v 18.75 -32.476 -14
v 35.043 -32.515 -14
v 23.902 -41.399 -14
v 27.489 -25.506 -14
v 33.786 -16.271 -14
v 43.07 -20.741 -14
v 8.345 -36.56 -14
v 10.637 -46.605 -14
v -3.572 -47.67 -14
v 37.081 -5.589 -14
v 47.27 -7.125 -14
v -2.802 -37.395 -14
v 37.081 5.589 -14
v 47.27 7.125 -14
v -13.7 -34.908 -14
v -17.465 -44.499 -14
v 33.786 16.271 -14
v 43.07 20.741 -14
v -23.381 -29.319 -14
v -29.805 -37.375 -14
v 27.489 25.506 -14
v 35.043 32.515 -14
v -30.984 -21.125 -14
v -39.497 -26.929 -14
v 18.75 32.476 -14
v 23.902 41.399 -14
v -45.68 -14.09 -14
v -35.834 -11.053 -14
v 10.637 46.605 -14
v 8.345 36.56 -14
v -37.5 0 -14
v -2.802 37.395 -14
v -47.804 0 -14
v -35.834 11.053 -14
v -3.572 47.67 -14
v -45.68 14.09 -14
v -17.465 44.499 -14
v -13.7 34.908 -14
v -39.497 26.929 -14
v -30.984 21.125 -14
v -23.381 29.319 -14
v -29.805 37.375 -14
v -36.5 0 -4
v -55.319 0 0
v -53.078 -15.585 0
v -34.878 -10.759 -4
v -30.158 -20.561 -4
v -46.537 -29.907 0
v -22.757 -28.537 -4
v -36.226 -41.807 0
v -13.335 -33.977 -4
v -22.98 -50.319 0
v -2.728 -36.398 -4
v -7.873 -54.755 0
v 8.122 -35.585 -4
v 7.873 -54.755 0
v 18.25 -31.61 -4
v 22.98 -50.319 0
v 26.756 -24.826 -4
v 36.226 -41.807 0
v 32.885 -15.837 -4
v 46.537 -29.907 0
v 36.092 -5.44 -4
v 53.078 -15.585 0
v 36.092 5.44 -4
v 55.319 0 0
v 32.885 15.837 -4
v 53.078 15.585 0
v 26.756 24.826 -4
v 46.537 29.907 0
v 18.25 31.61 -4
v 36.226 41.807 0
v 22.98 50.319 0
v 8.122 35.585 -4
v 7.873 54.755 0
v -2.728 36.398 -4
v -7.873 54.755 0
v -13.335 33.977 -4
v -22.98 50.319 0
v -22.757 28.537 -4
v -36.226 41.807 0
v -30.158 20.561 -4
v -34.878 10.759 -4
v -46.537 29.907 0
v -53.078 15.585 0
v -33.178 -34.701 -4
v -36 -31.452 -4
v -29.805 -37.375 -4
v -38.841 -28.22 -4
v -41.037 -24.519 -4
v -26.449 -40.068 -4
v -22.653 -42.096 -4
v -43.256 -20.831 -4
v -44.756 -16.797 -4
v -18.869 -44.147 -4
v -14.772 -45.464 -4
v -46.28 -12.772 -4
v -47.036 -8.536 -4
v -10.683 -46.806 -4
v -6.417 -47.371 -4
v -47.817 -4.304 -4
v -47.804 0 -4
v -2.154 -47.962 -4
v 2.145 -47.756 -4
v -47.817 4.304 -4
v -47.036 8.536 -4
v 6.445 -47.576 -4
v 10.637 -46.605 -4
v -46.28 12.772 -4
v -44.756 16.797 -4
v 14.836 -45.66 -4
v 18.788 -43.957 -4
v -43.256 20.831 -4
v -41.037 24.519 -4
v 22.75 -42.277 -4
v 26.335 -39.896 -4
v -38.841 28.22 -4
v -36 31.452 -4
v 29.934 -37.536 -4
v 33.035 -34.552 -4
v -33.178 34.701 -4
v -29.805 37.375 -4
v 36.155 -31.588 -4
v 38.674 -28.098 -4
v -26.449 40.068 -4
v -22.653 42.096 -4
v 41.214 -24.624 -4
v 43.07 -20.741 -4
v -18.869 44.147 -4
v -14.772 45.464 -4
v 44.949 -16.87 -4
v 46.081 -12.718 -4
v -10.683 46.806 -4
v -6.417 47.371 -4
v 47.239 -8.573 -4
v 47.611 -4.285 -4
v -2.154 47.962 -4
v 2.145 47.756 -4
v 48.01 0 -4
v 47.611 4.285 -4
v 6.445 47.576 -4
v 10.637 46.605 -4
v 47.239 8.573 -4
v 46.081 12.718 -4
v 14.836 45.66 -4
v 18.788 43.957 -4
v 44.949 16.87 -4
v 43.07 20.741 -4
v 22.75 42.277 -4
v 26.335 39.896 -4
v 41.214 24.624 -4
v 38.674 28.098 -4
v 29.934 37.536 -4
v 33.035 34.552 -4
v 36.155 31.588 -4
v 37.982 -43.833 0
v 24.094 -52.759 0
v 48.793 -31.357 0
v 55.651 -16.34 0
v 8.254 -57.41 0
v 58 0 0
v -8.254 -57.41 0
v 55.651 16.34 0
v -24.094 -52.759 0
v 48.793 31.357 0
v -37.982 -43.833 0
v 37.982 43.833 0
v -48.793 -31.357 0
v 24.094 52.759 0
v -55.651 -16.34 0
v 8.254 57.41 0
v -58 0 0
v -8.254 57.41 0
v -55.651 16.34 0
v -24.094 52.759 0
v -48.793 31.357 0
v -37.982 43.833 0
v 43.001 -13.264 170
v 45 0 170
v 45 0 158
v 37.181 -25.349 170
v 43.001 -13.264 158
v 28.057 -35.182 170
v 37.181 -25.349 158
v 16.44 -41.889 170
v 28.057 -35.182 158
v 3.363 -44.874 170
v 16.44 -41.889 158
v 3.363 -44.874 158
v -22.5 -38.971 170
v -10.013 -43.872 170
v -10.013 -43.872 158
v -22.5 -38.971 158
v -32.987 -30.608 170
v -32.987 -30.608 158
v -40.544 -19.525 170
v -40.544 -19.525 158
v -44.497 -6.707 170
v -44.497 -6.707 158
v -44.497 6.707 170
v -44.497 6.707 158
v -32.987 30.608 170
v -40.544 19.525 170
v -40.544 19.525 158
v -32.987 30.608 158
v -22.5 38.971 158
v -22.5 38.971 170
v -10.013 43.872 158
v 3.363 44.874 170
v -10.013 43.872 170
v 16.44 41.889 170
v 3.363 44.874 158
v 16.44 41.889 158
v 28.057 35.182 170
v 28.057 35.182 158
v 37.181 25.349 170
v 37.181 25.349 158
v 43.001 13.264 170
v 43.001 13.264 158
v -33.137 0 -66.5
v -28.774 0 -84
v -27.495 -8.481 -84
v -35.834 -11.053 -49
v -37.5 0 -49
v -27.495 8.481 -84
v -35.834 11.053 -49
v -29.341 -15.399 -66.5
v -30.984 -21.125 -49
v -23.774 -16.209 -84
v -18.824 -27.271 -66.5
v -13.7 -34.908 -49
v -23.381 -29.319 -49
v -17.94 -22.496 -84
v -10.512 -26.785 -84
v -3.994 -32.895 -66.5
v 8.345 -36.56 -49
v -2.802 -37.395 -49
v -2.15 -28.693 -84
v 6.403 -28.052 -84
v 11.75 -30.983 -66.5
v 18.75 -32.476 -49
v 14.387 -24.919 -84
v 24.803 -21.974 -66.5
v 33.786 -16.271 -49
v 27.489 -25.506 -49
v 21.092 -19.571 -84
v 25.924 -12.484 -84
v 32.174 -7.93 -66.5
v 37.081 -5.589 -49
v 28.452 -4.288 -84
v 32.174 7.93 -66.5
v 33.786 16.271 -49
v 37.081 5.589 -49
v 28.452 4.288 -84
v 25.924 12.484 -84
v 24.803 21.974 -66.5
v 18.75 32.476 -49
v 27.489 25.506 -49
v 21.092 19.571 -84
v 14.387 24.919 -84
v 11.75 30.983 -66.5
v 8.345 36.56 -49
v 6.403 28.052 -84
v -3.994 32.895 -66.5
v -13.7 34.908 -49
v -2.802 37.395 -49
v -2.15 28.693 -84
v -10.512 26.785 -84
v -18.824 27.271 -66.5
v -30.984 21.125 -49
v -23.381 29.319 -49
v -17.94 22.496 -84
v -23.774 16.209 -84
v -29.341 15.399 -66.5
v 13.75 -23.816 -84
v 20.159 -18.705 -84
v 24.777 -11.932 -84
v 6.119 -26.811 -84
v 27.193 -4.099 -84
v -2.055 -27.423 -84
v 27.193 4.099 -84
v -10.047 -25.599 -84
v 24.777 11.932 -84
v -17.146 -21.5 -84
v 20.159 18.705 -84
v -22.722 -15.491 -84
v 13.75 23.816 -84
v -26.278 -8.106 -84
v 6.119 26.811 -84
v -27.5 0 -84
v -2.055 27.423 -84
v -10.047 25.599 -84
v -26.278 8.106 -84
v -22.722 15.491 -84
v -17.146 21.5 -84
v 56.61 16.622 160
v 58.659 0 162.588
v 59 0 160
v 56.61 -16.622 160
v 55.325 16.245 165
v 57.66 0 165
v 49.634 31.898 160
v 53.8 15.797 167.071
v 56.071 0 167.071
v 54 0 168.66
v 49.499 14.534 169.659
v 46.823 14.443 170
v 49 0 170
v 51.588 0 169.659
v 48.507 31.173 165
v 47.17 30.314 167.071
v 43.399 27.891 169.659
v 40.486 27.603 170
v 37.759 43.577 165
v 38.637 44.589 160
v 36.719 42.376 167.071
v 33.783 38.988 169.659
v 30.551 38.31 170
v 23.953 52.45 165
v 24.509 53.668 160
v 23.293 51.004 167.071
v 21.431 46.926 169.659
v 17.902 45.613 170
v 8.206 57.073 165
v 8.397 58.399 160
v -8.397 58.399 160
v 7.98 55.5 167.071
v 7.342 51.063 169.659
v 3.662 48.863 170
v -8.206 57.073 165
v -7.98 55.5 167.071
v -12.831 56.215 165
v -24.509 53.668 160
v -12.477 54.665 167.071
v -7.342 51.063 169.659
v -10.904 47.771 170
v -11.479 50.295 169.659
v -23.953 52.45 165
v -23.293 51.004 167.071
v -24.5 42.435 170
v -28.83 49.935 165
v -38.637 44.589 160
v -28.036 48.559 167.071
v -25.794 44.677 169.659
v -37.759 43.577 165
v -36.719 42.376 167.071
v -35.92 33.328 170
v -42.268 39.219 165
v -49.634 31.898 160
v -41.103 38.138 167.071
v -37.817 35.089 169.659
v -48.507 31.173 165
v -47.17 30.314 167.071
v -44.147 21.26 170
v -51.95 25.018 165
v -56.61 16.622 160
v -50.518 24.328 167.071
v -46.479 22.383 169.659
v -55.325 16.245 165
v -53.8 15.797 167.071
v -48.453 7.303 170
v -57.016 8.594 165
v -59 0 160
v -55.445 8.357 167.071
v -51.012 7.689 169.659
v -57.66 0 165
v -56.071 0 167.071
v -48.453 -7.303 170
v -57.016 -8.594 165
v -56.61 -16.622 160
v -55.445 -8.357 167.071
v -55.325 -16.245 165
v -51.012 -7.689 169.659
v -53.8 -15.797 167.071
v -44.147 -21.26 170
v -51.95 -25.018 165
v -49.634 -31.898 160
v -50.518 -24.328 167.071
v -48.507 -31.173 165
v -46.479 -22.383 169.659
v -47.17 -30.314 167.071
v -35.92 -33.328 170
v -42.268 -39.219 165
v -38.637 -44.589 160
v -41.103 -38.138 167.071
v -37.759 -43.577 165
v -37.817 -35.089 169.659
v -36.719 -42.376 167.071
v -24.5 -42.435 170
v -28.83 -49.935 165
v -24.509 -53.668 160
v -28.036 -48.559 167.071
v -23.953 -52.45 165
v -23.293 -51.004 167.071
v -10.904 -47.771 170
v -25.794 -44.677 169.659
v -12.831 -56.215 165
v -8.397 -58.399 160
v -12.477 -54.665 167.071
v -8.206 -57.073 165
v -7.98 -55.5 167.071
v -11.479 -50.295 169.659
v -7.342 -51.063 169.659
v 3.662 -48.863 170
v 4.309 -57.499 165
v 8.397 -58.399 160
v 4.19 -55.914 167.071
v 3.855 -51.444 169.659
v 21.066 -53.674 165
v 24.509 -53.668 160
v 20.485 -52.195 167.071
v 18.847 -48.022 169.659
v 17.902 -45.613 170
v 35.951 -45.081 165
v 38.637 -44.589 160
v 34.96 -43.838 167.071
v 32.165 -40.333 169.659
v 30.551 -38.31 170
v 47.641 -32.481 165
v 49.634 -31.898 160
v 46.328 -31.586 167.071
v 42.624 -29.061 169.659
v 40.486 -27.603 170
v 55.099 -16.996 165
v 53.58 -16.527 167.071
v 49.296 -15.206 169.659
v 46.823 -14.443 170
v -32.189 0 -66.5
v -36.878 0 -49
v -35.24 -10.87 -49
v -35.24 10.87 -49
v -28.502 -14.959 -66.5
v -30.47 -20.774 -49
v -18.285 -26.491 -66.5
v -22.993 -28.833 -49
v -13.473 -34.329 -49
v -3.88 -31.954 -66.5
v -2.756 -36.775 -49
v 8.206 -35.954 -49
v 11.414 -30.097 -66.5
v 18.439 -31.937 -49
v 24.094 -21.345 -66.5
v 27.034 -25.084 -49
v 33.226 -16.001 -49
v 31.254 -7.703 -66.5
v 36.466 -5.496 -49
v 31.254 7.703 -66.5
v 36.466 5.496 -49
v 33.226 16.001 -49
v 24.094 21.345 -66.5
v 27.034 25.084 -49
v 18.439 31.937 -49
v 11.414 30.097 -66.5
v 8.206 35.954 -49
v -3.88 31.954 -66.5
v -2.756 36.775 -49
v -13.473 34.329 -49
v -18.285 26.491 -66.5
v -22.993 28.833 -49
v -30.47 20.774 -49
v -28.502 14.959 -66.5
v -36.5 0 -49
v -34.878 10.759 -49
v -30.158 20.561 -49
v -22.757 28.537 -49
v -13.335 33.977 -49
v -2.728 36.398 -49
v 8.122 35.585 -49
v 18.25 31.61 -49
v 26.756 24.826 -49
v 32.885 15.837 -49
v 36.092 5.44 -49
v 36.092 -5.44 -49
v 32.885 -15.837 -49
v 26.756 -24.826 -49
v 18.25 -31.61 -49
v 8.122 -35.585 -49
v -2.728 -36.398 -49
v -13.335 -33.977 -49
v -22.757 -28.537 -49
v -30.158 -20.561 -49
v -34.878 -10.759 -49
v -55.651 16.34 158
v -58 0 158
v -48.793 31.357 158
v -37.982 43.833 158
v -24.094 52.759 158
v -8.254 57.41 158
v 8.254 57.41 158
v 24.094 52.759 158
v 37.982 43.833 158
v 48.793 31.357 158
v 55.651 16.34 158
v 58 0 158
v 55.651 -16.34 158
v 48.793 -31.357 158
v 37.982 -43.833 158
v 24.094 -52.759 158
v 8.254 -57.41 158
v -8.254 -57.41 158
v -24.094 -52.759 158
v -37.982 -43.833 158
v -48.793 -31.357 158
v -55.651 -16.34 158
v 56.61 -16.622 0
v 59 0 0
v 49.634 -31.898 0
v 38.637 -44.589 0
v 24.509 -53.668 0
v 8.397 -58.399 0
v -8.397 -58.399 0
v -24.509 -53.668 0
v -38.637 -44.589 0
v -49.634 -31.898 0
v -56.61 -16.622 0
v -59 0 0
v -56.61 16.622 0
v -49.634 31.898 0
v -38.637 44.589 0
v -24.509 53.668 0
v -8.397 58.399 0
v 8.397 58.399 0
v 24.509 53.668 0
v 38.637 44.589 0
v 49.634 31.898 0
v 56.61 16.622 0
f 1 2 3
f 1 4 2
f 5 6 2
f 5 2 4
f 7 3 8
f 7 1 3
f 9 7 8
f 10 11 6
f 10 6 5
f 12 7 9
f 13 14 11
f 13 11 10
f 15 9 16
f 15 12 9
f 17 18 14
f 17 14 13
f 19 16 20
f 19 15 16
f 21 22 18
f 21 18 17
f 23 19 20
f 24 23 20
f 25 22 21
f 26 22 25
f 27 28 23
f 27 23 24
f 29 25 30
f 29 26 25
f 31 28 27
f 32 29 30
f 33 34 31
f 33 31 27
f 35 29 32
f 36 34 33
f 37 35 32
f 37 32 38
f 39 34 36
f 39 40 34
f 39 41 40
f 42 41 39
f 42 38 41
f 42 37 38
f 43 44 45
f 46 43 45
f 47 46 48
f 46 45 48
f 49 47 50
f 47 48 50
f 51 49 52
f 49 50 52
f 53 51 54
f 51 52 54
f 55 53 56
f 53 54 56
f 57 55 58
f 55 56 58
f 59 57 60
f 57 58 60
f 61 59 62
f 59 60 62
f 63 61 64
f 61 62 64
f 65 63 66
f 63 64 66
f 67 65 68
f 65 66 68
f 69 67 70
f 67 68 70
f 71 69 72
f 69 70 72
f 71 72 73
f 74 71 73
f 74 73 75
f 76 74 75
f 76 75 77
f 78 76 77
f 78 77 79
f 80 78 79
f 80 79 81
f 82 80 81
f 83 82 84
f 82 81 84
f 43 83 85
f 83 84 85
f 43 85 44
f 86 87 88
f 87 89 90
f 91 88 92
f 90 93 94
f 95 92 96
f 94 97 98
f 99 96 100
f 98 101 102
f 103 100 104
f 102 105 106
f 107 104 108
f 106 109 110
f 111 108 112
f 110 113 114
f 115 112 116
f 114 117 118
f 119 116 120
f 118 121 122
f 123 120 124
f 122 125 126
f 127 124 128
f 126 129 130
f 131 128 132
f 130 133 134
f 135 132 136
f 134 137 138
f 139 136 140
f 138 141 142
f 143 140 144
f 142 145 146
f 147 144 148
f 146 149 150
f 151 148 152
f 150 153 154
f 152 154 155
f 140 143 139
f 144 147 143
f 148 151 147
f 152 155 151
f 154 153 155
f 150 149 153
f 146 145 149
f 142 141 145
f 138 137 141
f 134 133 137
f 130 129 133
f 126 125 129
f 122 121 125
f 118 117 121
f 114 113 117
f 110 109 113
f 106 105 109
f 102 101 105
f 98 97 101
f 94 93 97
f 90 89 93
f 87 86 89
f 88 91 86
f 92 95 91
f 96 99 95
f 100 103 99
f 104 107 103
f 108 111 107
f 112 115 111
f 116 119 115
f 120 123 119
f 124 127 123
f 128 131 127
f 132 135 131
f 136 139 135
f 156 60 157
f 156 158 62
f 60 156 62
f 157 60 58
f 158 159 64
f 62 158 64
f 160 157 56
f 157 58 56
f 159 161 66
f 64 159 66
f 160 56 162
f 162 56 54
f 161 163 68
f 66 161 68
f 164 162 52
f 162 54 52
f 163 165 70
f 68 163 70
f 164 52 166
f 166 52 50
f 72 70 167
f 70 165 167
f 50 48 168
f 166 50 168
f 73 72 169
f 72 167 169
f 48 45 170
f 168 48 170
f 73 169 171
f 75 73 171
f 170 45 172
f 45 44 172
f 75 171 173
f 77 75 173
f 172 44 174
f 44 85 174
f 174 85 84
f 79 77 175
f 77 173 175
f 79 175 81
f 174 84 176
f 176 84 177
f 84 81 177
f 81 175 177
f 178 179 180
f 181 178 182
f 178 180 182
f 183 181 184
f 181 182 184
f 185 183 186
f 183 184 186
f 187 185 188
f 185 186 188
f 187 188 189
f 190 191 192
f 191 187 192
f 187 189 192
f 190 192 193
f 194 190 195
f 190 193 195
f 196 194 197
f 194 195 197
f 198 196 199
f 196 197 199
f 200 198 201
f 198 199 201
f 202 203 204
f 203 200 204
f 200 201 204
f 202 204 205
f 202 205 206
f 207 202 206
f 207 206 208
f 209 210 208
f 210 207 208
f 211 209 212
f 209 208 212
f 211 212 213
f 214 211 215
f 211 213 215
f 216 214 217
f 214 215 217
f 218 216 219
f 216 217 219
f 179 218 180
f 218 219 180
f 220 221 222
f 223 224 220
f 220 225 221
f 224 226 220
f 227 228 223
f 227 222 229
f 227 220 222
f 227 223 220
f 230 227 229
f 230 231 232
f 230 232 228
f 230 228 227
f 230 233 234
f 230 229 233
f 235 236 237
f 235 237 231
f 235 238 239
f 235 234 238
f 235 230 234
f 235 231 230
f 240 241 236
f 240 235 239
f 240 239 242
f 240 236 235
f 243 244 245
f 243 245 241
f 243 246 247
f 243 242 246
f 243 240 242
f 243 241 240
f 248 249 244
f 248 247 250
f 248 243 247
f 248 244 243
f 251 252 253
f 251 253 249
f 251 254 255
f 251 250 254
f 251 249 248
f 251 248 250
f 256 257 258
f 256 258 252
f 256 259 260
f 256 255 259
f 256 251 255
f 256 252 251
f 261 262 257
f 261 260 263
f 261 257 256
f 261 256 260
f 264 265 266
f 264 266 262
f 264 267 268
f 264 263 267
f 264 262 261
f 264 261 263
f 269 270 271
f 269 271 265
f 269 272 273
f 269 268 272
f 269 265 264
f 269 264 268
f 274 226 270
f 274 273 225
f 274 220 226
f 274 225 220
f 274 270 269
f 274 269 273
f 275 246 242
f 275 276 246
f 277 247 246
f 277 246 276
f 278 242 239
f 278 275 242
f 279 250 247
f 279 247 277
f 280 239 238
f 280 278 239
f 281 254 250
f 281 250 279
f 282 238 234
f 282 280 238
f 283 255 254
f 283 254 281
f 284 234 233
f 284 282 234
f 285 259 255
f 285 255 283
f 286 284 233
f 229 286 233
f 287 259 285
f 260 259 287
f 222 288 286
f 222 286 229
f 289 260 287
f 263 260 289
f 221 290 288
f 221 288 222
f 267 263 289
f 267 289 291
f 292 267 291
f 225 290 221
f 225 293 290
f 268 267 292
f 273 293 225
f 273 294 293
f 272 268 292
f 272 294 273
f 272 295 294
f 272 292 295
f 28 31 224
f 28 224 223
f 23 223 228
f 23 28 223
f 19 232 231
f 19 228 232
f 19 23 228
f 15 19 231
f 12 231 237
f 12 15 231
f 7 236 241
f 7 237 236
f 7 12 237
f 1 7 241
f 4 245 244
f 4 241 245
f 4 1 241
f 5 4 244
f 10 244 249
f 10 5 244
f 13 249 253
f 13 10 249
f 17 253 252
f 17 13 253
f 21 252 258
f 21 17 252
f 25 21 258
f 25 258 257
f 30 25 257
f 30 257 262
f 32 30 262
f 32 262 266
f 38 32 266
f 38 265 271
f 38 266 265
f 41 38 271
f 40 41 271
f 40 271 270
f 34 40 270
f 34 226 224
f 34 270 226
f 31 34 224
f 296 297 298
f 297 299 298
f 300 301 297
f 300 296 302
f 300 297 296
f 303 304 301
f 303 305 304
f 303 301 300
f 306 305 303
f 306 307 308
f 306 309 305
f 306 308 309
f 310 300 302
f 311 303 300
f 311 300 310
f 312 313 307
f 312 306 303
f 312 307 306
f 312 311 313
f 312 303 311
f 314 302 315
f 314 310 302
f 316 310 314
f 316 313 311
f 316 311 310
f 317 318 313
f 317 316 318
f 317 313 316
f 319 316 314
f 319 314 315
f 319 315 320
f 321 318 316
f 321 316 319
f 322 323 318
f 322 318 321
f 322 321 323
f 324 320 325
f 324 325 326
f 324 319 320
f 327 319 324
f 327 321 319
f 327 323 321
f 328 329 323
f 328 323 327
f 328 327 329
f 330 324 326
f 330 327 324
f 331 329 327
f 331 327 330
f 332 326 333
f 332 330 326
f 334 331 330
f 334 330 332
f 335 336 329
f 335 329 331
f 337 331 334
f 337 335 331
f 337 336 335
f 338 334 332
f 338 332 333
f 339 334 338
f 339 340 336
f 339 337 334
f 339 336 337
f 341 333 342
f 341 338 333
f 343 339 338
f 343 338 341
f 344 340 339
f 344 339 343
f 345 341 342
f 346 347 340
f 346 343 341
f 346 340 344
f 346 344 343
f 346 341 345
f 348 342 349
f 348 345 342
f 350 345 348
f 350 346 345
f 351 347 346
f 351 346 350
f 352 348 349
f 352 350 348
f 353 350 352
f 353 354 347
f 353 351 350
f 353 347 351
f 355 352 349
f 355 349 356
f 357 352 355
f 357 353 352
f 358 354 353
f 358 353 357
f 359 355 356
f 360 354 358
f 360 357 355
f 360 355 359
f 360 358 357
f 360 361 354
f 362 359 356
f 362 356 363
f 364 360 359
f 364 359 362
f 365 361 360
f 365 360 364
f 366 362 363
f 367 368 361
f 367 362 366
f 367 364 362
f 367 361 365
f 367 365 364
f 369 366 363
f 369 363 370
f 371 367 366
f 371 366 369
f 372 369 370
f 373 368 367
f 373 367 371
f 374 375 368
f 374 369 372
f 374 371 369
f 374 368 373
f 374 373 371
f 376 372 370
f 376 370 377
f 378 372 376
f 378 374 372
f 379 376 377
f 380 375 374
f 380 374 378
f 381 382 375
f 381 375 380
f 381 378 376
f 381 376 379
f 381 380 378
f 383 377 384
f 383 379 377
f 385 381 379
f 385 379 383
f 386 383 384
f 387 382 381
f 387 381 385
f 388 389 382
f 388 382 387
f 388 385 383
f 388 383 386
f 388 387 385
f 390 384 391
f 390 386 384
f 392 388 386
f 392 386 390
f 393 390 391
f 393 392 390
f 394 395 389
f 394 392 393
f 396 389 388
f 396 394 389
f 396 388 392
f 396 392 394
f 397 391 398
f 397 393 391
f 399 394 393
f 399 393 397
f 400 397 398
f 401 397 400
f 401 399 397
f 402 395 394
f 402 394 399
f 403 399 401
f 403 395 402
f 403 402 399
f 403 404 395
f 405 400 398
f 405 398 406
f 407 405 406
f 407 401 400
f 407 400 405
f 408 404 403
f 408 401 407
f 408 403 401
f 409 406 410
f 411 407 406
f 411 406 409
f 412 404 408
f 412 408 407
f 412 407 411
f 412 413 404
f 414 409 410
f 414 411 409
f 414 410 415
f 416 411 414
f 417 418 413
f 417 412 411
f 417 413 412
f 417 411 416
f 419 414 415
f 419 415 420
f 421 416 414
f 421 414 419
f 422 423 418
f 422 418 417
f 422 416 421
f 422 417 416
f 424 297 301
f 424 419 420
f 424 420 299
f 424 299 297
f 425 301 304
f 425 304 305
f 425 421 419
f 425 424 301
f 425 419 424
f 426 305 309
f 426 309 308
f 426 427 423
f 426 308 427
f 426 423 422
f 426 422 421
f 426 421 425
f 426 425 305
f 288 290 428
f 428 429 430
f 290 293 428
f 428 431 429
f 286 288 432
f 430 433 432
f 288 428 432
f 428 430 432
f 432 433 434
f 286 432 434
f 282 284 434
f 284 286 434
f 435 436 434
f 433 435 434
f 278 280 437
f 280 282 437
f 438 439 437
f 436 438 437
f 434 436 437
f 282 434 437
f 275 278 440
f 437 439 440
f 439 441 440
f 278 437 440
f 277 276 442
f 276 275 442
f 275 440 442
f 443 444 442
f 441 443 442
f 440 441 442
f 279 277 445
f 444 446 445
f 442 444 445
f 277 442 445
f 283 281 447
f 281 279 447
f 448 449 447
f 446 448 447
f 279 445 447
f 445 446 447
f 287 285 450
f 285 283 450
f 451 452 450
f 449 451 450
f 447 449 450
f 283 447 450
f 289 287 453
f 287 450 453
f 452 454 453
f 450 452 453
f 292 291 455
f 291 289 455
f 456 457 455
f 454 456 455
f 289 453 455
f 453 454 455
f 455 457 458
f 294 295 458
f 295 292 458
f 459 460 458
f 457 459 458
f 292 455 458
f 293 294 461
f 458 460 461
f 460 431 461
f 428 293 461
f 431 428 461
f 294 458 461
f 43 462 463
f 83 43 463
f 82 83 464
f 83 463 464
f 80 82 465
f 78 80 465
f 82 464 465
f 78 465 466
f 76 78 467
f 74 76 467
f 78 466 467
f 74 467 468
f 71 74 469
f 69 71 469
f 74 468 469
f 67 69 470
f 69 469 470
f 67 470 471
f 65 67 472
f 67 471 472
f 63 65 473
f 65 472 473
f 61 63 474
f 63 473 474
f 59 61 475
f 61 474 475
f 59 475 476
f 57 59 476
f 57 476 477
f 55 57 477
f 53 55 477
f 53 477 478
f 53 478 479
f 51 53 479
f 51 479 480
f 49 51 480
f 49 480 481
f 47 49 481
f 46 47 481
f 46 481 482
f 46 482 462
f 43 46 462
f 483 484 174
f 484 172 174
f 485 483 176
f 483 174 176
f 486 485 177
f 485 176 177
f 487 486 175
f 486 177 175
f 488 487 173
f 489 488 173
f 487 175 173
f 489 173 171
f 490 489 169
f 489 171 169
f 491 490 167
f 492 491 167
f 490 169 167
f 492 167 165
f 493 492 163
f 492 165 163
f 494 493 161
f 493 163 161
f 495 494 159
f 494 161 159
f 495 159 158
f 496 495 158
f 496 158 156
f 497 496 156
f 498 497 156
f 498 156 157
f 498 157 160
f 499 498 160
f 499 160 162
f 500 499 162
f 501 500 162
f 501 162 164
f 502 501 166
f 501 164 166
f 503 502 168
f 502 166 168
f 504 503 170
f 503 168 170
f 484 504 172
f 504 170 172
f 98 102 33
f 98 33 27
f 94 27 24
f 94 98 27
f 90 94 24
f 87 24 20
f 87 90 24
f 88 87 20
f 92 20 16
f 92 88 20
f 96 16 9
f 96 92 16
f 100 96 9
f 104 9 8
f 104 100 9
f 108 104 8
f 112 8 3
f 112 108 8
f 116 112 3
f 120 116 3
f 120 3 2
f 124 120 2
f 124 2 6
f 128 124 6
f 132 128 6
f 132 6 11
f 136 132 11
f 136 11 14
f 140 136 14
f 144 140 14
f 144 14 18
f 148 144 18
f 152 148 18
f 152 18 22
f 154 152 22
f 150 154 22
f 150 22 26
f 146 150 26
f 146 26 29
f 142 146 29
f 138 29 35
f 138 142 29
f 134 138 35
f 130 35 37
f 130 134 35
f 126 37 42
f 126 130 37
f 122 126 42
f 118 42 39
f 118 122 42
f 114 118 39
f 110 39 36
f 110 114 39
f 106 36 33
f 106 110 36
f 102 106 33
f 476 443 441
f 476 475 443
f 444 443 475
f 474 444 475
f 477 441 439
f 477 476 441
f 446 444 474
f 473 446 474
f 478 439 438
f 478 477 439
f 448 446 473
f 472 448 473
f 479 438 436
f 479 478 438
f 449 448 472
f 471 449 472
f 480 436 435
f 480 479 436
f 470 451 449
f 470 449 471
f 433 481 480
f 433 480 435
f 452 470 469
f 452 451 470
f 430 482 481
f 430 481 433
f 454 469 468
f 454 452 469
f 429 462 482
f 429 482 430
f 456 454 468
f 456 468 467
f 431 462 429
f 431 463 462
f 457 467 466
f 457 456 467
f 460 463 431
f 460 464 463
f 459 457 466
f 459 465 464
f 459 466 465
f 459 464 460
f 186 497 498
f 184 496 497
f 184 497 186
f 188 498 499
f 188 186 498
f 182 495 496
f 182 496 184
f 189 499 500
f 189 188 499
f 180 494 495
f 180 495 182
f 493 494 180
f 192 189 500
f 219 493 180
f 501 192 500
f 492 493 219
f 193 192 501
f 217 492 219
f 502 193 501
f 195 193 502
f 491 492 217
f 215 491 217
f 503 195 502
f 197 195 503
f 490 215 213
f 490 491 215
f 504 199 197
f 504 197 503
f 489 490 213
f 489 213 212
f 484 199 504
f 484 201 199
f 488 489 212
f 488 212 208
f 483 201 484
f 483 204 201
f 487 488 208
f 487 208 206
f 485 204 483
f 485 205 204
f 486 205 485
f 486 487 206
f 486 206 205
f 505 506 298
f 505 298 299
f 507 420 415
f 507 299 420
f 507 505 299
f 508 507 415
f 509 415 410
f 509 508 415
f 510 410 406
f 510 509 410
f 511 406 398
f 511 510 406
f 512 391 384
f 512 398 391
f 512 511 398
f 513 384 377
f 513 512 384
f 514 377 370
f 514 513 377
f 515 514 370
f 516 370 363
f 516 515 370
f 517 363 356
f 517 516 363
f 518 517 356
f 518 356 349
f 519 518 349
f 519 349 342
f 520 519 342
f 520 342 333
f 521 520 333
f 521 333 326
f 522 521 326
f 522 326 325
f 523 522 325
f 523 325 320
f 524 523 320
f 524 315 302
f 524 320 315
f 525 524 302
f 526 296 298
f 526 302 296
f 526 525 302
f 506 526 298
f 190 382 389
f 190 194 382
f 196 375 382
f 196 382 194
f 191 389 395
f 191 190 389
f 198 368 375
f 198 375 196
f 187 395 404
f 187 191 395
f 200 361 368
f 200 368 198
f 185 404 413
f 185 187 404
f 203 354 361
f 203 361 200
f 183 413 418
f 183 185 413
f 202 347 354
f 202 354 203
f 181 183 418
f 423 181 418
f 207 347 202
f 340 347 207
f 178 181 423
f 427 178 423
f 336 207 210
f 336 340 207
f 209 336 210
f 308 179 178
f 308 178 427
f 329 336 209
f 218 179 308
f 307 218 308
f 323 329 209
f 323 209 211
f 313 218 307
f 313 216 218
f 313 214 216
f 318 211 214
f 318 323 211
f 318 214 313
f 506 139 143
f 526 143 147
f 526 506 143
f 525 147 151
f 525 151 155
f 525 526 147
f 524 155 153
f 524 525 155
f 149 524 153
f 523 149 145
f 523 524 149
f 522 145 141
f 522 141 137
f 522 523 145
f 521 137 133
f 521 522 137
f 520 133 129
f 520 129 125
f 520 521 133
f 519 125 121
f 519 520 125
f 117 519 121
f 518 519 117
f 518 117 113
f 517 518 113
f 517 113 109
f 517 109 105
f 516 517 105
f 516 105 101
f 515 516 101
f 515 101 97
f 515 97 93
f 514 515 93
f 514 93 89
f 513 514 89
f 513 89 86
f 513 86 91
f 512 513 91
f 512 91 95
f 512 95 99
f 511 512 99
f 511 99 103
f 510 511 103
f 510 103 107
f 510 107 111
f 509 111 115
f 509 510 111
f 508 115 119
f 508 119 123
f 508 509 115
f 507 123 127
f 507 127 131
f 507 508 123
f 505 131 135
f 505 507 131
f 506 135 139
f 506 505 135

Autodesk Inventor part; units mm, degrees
ref_plane "YZ Plane" through (0, 0, 0) normal (1, 0, 0) x (0, 1, 0)
ref_plane "XZ Plane" through (0, 0, 0) normal (0, 1, 0) x (-1, 0, 0)
ref_plane "XY Plane" through (0, 0, 0) normal (0, 0, 1) x (1, 0, 0)
sketch "Эскиз1" plane through (0, 0, 0) normal (0, 0, 1) x (1, 0, 0)
  circle A0 centre (0, 0) radius 59
  dimension "d0" = 118
extrude "Выдавливание1" add sketch "Эскиз1" along normal blind 150
extrude "Выдавливание2" add sketch "Эскиз1" against normal blind 4 draft -70
sketch "Эскиз2" plane through (0, 0, -4) normal (0, 0, -1) x (-1, 0, 0)
  circle A0 centre (0, 0) radius 47.803848
extrude "Выдавливание3" add sketch "Эскиз2" along normal blind 10
sketch "Эскиз3" plane through (0, 0, -14) normal (0, 0, -1) x (-1, 0, 0)
  circle A0 centre (0, 0) radius 37.5
  circle A1 centre (0, 0) radius 36.5
  dimension "d7" = 75
  dimension "d20" = 73
extrude "Выдавливание4" add sketch "Эскиз3" along normal blind 35 contours A0 | A1
sketch "Эскиз4" plane through (0, 0, -49) normal (0, 0, -1) x (-1, 0, 0)
  point P0 (0, 0)
sketch "Эскиз5" plane through (0, 0, -49) normal (0, 0, -1) x (-1, 0, 0)
  circle A0 centre (0, 0) radius 37.5
  circle A1 centre (0, 0) radius 35
  dimension "d16" = 70
sketch "Эскиз5 outline for Выдавливание5" plane through (0, 0, -49) normal (0, 0, -1) x (-1, 0, 0)
  circle A0 centre (0, 0) radius 37.5
extrude "Выдавливание5" add sketch "Эскиз5 outline for Выдавливание5" along normal blind 35 draft -14
sketch "Эскиз6" plane through (0, 0, 150) normal (0, 0, 1) x (1, 0, 0)
  circle A0 centre (0, 0) radius 59
  circle A1 centre (0, 0) radius 45
  dimension "d12" = 90
extrude "Выдавливание6" add sketch "Эскиз6" along normal blind 20
fillet "Сопряжение1" radius 10 1 edges at (-59, 0, 170)
sketch "Эскиз7" plane through (0, 0, -84) normal (0, 0, -1) x (-1, 0, 0)
  circle A0 centre (0, 0) radius 28.77352
  circle A1 centre (0, 0) radius 27.5
  dimension "d17" = 55
extrude "Выдавливание7" cut sketch "Эскиз7" against normal blind 35 draft 15 contours A1
sketch "Эскиз8" plane through (0, 0, -49) normal (0, 0, -1) x (-1, 0, 0)
  circle A0 centre (0, 0) radius 36.5
  dimension "d21" = 73
extrude "Выдавливание8" cut sketch "Эскиз8" against normal blind 35
sketch "Эскиз9" plane through (0, 0, -14) normal (0, 0, -1) x (-1, 0, 0)
  circle A0 centre (0, 0) radius 36.5
  dimension "d24" = 73
extrude "Выдавливание9" cut sketch "Эскиз9" against normal blind 10
sketch "Эскиз10" plane through (0, 0, -4) normal (0, 0, -1) x (-1, 0, 0)
  circle A0 centre (0, 0) radius 36.5
  dimension "d27" = 73
extrude "Выдавливание10" cut sketch "Эскиз10" against normal blind 4 draft 78
sketch "Эскиз11" plane through (0, 0, 0) normal (0, 0, -1) x (-1, 0, 0)
  circle A0 centre (0, 0) radius 58
  dimension "d30" = 116
extrude "Выдавливание11" cut sketch "Эскиз11" against normal blind 158
properties part number "Колибри-Шаблон"
